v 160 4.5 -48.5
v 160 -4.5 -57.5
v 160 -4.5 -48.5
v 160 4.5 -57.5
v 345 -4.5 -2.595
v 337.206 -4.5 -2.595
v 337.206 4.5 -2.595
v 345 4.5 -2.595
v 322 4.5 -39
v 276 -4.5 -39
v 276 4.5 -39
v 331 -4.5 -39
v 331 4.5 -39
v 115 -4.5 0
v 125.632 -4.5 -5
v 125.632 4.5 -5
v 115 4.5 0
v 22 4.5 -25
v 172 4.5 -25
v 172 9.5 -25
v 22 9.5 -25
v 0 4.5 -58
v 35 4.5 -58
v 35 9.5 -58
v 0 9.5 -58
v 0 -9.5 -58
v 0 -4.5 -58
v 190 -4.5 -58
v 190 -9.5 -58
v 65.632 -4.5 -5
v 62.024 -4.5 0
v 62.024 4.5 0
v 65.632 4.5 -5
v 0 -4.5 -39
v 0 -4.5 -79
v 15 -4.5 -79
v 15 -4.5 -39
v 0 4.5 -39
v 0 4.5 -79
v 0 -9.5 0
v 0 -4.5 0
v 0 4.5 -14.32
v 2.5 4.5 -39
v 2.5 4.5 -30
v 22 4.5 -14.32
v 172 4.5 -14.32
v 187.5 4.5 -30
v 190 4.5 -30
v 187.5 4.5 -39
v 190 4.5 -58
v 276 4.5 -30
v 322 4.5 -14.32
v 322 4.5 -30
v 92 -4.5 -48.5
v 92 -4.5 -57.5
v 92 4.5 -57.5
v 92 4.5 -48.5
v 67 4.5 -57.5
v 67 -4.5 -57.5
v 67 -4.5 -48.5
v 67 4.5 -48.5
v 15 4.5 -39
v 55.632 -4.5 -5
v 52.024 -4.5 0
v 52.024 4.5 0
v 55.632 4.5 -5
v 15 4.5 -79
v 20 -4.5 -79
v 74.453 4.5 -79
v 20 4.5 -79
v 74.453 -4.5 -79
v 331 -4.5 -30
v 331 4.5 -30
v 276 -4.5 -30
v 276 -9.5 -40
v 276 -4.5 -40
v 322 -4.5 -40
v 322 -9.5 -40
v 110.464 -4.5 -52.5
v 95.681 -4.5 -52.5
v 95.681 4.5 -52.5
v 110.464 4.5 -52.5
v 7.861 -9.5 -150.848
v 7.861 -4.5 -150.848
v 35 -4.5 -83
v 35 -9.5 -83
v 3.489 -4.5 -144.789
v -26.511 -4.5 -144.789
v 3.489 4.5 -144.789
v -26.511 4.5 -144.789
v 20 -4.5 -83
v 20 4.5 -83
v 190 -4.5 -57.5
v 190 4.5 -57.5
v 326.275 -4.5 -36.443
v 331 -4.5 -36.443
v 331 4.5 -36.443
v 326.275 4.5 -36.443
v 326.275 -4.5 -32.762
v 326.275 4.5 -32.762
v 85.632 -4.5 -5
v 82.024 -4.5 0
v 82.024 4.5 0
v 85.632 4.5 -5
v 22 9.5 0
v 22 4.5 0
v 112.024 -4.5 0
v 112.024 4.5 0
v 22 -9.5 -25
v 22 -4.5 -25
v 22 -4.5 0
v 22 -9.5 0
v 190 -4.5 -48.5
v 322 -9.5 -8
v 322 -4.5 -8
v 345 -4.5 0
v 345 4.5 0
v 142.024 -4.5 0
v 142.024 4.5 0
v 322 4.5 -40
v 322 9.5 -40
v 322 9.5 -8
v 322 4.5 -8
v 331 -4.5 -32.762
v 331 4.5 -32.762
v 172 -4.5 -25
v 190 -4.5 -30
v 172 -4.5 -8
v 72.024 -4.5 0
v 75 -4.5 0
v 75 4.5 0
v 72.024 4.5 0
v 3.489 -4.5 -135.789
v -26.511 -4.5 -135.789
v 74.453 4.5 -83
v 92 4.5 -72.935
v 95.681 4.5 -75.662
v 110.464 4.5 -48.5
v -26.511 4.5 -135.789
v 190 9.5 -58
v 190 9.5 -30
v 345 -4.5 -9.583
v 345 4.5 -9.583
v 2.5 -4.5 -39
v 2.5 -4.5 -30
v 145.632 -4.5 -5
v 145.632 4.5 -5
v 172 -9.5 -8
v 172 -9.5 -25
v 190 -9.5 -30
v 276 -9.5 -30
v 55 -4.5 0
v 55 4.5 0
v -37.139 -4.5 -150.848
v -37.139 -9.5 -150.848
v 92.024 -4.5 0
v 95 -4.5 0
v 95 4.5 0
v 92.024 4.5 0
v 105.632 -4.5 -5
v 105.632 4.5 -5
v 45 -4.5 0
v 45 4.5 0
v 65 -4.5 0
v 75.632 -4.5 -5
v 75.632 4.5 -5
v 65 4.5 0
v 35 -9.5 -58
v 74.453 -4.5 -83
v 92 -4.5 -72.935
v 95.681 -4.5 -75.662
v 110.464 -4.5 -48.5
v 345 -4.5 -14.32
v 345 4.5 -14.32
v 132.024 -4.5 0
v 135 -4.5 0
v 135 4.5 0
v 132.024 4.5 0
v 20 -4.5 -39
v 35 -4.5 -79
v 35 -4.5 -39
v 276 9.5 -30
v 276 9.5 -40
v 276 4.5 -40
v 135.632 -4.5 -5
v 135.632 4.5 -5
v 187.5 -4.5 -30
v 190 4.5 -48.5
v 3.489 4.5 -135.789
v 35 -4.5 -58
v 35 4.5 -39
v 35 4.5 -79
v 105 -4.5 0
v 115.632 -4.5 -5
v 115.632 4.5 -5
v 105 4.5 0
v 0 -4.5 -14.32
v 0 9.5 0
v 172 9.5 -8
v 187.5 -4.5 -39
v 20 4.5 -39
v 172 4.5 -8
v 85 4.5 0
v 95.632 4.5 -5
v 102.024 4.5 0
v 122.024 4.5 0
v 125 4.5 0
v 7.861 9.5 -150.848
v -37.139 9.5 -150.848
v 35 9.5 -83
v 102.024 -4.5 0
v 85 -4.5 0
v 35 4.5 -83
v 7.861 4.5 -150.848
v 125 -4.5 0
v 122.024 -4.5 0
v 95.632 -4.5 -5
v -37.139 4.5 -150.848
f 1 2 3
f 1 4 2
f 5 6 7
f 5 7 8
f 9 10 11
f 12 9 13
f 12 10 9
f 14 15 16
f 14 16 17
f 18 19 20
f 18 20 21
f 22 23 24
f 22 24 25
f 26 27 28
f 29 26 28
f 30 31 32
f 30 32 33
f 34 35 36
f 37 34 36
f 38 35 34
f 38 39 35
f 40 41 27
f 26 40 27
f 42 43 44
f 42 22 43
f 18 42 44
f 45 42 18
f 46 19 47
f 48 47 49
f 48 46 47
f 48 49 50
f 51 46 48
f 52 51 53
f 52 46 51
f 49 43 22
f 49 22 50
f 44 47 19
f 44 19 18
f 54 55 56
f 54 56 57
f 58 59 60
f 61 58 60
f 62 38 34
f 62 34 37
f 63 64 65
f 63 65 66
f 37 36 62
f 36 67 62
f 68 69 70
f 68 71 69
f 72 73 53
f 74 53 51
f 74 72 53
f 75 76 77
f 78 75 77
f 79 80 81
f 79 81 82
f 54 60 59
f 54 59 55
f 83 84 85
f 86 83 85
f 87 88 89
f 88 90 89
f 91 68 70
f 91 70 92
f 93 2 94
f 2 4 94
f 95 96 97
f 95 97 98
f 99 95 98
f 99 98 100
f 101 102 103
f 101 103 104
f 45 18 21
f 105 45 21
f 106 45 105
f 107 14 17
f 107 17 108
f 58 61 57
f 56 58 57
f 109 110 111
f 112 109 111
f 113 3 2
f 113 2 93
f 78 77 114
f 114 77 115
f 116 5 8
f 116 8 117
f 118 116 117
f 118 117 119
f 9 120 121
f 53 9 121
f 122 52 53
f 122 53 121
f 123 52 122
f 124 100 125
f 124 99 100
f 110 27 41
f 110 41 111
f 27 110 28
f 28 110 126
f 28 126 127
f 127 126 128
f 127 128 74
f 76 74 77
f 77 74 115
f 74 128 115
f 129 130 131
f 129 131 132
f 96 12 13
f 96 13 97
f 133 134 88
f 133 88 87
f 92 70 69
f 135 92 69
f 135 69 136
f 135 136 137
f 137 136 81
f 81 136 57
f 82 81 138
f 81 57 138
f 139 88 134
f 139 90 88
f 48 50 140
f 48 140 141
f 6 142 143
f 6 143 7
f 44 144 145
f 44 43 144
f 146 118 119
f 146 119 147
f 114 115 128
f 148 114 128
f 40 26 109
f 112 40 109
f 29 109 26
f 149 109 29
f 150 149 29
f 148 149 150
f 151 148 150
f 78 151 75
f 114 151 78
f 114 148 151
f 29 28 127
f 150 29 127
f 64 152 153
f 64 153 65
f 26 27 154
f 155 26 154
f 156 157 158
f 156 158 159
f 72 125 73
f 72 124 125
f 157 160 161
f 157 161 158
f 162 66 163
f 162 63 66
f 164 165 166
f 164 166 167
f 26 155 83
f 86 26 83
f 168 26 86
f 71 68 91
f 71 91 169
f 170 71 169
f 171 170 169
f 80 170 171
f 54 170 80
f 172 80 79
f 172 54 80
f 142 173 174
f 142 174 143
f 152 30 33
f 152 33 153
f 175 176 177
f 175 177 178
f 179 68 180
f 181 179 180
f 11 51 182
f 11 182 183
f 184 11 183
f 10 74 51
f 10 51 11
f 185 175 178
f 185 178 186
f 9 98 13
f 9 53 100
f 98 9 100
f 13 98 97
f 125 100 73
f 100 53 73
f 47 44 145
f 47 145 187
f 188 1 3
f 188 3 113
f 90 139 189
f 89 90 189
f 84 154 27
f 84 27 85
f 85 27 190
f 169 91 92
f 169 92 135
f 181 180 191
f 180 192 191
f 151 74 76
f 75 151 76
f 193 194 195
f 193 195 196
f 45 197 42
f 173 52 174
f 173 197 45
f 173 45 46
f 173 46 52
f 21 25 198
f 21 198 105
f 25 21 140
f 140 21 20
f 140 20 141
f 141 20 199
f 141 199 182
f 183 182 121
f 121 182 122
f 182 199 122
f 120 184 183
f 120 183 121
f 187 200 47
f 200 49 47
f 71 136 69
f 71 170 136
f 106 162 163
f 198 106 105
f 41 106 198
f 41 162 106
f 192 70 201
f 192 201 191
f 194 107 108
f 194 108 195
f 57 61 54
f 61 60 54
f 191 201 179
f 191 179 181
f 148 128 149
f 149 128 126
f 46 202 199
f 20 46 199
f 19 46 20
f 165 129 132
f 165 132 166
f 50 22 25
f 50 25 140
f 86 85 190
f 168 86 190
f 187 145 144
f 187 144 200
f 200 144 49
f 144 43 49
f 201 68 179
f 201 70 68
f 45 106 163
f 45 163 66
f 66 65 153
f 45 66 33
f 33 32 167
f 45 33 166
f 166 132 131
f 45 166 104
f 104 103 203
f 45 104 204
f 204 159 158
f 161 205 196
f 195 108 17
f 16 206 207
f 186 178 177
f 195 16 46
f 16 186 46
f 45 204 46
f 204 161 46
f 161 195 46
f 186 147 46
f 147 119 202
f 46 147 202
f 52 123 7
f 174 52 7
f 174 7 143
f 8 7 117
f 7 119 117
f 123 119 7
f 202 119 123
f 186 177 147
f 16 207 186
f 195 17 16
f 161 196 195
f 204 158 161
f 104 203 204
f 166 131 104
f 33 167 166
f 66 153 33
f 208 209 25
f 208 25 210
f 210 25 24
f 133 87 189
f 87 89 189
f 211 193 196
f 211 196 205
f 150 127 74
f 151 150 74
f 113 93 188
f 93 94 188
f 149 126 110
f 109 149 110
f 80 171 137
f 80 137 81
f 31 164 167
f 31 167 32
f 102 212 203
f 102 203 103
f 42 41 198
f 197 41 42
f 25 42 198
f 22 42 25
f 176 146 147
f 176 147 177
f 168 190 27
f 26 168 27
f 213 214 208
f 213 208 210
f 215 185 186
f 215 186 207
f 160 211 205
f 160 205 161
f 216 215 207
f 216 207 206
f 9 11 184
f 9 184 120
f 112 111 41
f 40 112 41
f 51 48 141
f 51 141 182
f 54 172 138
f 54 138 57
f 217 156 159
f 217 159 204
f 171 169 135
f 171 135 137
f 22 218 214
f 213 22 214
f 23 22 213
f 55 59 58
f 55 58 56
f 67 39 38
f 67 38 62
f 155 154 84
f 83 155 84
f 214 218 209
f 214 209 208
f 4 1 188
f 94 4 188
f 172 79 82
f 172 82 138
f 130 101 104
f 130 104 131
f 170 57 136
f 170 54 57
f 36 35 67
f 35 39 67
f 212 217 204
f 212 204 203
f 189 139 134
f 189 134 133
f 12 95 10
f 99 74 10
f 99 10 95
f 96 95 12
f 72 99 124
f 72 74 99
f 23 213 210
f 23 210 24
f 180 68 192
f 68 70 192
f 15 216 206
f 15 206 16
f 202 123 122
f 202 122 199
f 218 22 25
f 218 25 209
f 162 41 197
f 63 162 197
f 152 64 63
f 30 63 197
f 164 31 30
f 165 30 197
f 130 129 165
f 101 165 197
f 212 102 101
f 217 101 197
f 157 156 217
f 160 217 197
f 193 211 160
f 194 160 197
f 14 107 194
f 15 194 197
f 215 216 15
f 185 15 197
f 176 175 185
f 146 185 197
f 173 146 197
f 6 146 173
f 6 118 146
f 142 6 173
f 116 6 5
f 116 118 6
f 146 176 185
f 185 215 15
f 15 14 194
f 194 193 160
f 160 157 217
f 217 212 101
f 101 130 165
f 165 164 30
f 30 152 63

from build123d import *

# Parameters (mm, degrees)
F2_DEPTH  = 5
F3_W      = 185
F3_H      = 9
F4_DEPTH  = 4.5
F6_DEPTH  = 4.5
F8_DEPTH  = 5
F9_W      = 15
F9_H      = 40
F9_W_2    = 30
F9_H_2    = 9
F9_W_3    = 25
F10_DEPTH = 4.5
F14_DEPTH = 5
F16_DEPTH = 4.5


with BuildPart() as f2:
    # F1 (on offset) → F2 (new body)
    with BuildSketch(Plane.XZ.offset(-4.5)):
        Polygon((22, 0), (0, 0), (0, -58), (190, -58), (190, -30), (276, -30), (276, -40), (322, -40), (322, -8), (172, -8), (172, -25), (22, -25), align=None)
    extrude(amount=-F2_DEPTH)

    # F3 (on Front) → F4 (join, symmetric)
    with BuildSketch(Plane.XZ):
        with Locations((95, -34.5)):
            Rectangle(F3_W, F3_H)
        Polygon((331, -30), (276, -30), (276, -39), (331, -39), (331, -36.443051), (326.275468, -36.443051), (326.275468, -32.761794), (331, -32.761794), align=None)
    extrude(amount=F4_DEPTH, both=True)

    # F5 (on Front) → F6 (join, symmetric)
    with BuildSketch(Plane.XZ):
        Polygon((39.891679, 0), (0, 0), (0, -5), (0, -14.320182), (345, -14.320182), (345, -9.582848), (337.206424, -2.595493), (345, -2.595493), (345, 0), (142.02372, 0), (145.632293, -5), (135, 0), (132.02372, 0), (135.632293, -5), (125, 0), (122.02372, 0), (125.632293, -5), (115, 0), (112.02372, 0), (115.632293, -5), (105, 0), (102.02372, 0), (105.632293, -5), (95, 0), (92.02372, 0), (95.632293, -5), (85, 0), (82.02372, 0), (85.632293, -5), (75, 0), (72.02372, 0), (75.632293, -5), (65, 0), (62.02372, 0), (65.632293, -5), (55, 0), (52.02372, 0), (55.632293, -5), (45, 0), (40.031508, 0), align=None)
    extrude(amount=F6_DEPTH, both=True)


with BuildPart() as f8:
    # F7 (on offset) → F8 (new body)
    with BuildSketch(Plane.XZ.offset(-4.5)):
        Polygon((35, -58), (0, -58), (-37.139068, -150.847669), (7.860932, -150.847669), (35, -83), align=None)
    extrude(amount=-F8_DEPTH)


with BuildPart() as f10:
    # F9 (on Front) → F10 (new body, symmetric)
    with BuildSketch(Plane.XZ):
        with Locations((7.5, -59)):
            Rectangle(F9_W, F9_H)
        with Locations((27.5, -59)):
            Rectangle(F9_W, F9_H)
        with Locations((-11.511086, -140.289409)):
            Rectangle(F9_W_2, F9_H_2)
        with Locations((175, -53)):
            Rectangle(F9_W_2, F9_H_2)
        with Locations((79.5, -53)):
            Rectangle(F9_W_3, F9_H_2)
    extrude(amount=F10_DEPTH, both=True)


with BuildPart() as f11_1:
    # F11: instance of F8
    add(f8.part.mirror(Plane.XZ))


with BuildPart() as f14:
    # F13 (on offset) → F14 (new body)
    with BuildSketch(Plane.XZ.offset(4.5)):
        Polygon((22, 0), (0, 0), (0, -58), (190, -58), (190, -30), (276, -30), (276, -40), (322, -40), (322, -8), (172, -8), (172, -25), (22, -25), align=None)
    extrude(amount=F14_DEPTH)


with BuildPart() as f16:
    # F15 (on Front) → F16 (new body, symmetric)
    with BuildSketch(Plane.XZ):
        Polygon((74.453317, -79), (20, -79), (20, -83), (74.453317, -83), (95.681071, -75.662374), (95.681071, -52.5), (110.464296, -52.5), (110.464296, -48.5), (92, -48.5), (92, -72.93478), align=None)
    extrude(amount=F16_DEPTH, both=True)


solid = Compound([f2.part, f8.part, f10.part, f11_1.part, f14.part, f16.part])
